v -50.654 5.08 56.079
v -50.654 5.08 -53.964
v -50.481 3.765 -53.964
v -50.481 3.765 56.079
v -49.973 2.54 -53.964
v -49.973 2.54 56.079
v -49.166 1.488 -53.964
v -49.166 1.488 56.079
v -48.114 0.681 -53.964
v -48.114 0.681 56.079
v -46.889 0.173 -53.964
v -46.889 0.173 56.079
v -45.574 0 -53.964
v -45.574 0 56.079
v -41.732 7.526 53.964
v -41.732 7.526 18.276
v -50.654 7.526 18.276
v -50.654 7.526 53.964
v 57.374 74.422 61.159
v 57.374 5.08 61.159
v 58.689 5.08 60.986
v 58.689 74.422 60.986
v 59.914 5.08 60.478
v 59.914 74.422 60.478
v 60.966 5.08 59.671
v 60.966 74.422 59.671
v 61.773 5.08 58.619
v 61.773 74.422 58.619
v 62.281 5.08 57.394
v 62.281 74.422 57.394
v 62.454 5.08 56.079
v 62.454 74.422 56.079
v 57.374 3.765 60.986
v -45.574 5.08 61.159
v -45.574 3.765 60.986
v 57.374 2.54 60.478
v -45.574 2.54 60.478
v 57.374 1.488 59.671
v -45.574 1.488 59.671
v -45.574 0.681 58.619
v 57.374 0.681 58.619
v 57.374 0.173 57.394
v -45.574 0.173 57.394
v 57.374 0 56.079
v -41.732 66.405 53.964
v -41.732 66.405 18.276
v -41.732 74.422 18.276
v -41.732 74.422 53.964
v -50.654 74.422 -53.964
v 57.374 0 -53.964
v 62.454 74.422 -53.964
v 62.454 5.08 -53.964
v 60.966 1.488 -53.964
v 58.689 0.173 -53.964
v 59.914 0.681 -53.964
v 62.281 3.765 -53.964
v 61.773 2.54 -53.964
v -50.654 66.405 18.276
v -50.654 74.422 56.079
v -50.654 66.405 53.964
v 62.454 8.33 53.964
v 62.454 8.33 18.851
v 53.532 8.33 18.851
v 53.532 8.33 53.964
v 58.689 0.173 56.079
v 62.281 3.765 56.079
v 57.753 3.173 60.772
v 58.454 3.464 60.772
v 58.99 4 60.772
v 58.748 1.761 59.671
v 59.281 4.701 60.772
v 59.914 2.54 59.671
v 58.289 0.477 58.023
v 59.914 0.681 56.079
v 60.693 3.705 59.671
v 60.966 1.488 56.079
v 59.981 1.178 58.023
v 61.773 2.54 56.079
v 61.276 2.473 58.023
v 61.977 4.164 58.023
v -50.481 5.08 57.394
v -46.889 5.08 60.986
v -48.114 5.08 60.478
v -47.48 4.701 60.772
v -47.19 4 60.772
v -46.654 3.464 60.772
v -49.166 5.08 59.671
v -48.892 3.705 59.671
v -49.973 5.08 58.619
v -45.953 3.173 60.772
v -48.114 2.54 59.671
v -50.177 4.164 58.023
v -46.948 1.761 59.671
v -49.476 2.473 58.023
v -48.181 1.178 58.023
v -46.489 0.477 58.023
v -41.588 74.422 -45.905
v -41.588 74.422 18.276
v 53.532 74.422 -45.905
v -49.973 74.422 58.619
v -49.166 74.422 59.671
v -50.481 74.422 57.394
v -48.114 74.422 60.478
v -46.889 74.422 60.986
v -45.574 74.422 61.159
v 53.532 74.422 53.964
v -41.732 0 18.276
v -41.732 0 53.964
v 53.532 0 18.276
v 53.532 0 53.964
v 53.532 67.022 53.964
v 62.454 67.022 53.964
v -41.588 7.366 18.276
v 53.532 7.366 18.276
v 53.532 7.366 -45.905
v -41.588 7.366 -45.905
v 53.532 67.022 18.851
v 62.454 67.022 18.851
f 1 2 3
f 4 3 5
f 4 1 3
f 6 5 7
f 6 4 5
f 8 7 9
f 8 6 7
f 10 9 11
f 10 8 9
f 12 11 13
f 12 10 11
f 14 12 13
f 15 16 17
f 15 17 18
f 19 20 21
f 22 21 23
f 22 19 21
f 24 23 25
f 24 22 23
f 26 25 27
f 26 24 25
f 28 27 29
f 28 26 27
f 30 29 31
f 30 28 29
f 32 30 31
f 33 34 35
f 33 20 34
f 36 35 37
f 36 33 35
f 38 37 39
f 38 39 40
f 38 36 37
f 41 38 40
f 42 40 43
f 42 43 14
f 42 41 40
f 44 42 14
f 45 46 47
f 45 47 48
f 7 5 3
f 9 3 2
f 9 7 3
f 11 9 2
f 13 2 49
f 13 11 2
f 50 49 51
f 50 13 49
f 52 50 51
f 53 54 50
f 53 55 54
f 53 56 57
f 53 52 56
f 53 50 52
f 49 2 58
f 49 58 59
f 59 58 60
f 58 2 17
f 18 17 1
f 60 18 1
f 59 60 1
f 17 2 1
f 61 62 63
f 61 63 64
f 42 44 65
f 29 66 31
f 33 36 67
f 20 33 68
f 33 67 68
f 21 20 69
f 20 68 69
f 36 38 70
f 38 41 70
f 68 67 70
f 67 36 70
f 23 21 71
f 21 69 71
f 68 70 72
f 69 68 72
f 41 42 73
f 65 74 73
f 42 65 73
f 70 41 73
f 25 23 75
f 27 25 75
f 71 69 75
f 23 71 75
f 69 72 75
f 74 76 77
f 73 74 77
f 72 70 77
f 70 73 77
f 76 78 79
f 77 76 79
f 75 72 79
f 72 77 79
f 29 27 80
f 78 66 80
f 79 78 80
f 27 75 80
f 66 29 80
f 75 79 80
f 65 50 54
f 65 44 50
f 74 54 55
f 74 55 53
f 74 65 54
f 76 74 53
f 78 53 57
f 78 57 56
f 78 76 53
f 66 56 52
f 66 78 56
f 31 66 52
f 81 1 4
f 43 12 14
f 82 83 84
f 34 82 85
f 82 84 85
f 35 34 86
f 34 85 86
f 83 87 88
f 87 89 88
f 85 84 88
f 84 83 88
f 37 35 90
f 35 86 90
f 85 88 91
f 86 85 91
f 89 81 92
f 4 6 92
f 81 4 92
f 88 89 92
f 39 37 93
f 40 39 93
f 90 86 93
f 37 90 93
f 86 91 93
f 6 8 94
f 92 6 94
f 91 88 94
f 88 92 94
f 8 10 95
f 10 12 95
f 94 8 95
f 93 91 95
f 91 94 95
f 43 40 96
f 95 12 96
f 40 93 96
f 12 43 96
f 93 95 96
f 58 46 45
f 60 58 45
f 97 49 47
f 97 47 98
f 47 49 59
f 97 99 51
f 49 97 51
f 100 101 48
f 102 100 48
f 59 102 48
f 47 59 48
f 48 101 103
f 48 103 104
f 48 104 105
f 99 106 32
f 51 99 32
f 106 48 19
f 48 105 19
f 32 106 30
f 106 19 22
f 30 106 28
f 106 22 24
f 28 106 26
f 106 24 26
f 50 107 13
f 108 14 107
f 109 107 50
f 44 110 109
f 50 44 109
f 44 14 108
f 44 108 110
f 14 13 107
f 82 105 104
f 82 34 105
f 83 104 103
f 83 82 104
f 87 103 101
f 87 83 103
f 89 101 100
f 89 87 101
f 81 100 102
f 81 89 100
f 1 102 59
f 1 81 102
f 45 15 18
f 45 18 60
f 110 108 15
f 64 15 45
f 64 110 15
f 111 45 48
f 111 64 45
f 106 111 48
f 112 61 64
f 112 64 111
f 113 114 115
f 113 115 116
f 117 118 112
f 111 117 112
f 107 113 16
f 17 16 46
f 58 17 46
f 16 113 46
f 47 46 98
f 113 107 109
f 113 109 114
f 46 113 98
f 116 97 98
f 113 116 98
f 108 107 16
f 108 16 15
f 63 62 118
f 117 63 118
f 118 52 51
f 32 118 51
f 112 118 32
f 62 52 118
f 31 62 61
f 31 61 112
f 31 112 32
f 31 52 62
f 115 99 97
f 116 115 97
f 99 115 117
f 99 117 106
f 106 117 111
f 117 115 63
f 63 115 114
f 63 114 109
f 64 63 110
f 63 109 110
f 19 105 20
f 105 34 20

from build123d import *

# Parameters (mm, degrees)
F0_W     = 113.10765706
F0_H     = 115.1223033667
F1_DEPTH = 74.422
F2_W     = 95.2637083828
F2_H     = 35.6879141182
F3_DEPTH = 127.762
F4_W     = 58.8790695183
F4_H     = 35.6879141182
F5_DEPTH = 78.486
F6_W     = 58.6911616847
F6_H     = 35.1123027503
F7_DEPTH = 72.898
F8_W     = 95.1198078692
F8_H     = 64.1806852072
F9_DEPTH = 67.056
F10_R    = 5.08
F11_R    = 5.08


with BuildPart() as f1:
    # F0 (on Front) → F1 (new body)
    with BuildSketch(Plane.XZ):
        with Locations((5.9000151232, 3.5975724459)):
            Rectangle(F0_W, F0_H)
    extrude(amount=-F1_DEPTH)

    # F2 (on Front) → F3 (cut)
    with BuildSketch(Plane.XZ):
        with Locations((5.9000197798, 36.1196221784)):
            Rectangle(F2_W, F2_H)
    extrude(amount=-F3_DEPTH, mode=Mode.SUBTRACT)

    # F4 (on Right) → F5 (cut)
    with BuildSketch(Plane.YZ):
        with Locations((36.9658360723, 36.1196221784)):
            Rectangle(F4_W, F4_H)
    extrude(amount=-F5_DEPTH, mode=Mode.SUBTRACT)

    # F6 (on face) → F7 (cut)
    with BuildSketch(Plane.YZ.offset(62.4538436532)):
        with Locations((37.6759679057, 36.4074278623)):
            Rectangle(F6_W, F6_H)
    extrude(amount=-F7_DEPTH, mode=Mode.SUBTRACT)

    # F8 (on face) → F9 (cut)
    with BuildSketch(Plane(origin=(0, 74.422, 0), x_dir=(-1, 0, 0), z_dir=(0, 1, 0))):
        with Locations((-5.9719700366, -13.8146774843)):
            Rectangle(F8_W, F8_H)
    extrude(amount=-F9_DEPTH, mode=Mode.SUBTRACT)

    # F10
    f10_edges = [f1.edges().sort_by_distance(p)[0] for p in [
        (-50.653813, 0, 3.597572),
    ]]
    fillet(f10_edges, radius=F10_R)

    # F11
    f11_edges = [f1.edges().sort_by_distance(p)[0] for p in [
        (62.453844, 0, 3.597572),
        (8.440015, 0, 61.158724),
        (62.453844, 37.211, 61.158724),
    ]]
    fillet(f11_edges, radius=F11_R)


solid = f1.part
